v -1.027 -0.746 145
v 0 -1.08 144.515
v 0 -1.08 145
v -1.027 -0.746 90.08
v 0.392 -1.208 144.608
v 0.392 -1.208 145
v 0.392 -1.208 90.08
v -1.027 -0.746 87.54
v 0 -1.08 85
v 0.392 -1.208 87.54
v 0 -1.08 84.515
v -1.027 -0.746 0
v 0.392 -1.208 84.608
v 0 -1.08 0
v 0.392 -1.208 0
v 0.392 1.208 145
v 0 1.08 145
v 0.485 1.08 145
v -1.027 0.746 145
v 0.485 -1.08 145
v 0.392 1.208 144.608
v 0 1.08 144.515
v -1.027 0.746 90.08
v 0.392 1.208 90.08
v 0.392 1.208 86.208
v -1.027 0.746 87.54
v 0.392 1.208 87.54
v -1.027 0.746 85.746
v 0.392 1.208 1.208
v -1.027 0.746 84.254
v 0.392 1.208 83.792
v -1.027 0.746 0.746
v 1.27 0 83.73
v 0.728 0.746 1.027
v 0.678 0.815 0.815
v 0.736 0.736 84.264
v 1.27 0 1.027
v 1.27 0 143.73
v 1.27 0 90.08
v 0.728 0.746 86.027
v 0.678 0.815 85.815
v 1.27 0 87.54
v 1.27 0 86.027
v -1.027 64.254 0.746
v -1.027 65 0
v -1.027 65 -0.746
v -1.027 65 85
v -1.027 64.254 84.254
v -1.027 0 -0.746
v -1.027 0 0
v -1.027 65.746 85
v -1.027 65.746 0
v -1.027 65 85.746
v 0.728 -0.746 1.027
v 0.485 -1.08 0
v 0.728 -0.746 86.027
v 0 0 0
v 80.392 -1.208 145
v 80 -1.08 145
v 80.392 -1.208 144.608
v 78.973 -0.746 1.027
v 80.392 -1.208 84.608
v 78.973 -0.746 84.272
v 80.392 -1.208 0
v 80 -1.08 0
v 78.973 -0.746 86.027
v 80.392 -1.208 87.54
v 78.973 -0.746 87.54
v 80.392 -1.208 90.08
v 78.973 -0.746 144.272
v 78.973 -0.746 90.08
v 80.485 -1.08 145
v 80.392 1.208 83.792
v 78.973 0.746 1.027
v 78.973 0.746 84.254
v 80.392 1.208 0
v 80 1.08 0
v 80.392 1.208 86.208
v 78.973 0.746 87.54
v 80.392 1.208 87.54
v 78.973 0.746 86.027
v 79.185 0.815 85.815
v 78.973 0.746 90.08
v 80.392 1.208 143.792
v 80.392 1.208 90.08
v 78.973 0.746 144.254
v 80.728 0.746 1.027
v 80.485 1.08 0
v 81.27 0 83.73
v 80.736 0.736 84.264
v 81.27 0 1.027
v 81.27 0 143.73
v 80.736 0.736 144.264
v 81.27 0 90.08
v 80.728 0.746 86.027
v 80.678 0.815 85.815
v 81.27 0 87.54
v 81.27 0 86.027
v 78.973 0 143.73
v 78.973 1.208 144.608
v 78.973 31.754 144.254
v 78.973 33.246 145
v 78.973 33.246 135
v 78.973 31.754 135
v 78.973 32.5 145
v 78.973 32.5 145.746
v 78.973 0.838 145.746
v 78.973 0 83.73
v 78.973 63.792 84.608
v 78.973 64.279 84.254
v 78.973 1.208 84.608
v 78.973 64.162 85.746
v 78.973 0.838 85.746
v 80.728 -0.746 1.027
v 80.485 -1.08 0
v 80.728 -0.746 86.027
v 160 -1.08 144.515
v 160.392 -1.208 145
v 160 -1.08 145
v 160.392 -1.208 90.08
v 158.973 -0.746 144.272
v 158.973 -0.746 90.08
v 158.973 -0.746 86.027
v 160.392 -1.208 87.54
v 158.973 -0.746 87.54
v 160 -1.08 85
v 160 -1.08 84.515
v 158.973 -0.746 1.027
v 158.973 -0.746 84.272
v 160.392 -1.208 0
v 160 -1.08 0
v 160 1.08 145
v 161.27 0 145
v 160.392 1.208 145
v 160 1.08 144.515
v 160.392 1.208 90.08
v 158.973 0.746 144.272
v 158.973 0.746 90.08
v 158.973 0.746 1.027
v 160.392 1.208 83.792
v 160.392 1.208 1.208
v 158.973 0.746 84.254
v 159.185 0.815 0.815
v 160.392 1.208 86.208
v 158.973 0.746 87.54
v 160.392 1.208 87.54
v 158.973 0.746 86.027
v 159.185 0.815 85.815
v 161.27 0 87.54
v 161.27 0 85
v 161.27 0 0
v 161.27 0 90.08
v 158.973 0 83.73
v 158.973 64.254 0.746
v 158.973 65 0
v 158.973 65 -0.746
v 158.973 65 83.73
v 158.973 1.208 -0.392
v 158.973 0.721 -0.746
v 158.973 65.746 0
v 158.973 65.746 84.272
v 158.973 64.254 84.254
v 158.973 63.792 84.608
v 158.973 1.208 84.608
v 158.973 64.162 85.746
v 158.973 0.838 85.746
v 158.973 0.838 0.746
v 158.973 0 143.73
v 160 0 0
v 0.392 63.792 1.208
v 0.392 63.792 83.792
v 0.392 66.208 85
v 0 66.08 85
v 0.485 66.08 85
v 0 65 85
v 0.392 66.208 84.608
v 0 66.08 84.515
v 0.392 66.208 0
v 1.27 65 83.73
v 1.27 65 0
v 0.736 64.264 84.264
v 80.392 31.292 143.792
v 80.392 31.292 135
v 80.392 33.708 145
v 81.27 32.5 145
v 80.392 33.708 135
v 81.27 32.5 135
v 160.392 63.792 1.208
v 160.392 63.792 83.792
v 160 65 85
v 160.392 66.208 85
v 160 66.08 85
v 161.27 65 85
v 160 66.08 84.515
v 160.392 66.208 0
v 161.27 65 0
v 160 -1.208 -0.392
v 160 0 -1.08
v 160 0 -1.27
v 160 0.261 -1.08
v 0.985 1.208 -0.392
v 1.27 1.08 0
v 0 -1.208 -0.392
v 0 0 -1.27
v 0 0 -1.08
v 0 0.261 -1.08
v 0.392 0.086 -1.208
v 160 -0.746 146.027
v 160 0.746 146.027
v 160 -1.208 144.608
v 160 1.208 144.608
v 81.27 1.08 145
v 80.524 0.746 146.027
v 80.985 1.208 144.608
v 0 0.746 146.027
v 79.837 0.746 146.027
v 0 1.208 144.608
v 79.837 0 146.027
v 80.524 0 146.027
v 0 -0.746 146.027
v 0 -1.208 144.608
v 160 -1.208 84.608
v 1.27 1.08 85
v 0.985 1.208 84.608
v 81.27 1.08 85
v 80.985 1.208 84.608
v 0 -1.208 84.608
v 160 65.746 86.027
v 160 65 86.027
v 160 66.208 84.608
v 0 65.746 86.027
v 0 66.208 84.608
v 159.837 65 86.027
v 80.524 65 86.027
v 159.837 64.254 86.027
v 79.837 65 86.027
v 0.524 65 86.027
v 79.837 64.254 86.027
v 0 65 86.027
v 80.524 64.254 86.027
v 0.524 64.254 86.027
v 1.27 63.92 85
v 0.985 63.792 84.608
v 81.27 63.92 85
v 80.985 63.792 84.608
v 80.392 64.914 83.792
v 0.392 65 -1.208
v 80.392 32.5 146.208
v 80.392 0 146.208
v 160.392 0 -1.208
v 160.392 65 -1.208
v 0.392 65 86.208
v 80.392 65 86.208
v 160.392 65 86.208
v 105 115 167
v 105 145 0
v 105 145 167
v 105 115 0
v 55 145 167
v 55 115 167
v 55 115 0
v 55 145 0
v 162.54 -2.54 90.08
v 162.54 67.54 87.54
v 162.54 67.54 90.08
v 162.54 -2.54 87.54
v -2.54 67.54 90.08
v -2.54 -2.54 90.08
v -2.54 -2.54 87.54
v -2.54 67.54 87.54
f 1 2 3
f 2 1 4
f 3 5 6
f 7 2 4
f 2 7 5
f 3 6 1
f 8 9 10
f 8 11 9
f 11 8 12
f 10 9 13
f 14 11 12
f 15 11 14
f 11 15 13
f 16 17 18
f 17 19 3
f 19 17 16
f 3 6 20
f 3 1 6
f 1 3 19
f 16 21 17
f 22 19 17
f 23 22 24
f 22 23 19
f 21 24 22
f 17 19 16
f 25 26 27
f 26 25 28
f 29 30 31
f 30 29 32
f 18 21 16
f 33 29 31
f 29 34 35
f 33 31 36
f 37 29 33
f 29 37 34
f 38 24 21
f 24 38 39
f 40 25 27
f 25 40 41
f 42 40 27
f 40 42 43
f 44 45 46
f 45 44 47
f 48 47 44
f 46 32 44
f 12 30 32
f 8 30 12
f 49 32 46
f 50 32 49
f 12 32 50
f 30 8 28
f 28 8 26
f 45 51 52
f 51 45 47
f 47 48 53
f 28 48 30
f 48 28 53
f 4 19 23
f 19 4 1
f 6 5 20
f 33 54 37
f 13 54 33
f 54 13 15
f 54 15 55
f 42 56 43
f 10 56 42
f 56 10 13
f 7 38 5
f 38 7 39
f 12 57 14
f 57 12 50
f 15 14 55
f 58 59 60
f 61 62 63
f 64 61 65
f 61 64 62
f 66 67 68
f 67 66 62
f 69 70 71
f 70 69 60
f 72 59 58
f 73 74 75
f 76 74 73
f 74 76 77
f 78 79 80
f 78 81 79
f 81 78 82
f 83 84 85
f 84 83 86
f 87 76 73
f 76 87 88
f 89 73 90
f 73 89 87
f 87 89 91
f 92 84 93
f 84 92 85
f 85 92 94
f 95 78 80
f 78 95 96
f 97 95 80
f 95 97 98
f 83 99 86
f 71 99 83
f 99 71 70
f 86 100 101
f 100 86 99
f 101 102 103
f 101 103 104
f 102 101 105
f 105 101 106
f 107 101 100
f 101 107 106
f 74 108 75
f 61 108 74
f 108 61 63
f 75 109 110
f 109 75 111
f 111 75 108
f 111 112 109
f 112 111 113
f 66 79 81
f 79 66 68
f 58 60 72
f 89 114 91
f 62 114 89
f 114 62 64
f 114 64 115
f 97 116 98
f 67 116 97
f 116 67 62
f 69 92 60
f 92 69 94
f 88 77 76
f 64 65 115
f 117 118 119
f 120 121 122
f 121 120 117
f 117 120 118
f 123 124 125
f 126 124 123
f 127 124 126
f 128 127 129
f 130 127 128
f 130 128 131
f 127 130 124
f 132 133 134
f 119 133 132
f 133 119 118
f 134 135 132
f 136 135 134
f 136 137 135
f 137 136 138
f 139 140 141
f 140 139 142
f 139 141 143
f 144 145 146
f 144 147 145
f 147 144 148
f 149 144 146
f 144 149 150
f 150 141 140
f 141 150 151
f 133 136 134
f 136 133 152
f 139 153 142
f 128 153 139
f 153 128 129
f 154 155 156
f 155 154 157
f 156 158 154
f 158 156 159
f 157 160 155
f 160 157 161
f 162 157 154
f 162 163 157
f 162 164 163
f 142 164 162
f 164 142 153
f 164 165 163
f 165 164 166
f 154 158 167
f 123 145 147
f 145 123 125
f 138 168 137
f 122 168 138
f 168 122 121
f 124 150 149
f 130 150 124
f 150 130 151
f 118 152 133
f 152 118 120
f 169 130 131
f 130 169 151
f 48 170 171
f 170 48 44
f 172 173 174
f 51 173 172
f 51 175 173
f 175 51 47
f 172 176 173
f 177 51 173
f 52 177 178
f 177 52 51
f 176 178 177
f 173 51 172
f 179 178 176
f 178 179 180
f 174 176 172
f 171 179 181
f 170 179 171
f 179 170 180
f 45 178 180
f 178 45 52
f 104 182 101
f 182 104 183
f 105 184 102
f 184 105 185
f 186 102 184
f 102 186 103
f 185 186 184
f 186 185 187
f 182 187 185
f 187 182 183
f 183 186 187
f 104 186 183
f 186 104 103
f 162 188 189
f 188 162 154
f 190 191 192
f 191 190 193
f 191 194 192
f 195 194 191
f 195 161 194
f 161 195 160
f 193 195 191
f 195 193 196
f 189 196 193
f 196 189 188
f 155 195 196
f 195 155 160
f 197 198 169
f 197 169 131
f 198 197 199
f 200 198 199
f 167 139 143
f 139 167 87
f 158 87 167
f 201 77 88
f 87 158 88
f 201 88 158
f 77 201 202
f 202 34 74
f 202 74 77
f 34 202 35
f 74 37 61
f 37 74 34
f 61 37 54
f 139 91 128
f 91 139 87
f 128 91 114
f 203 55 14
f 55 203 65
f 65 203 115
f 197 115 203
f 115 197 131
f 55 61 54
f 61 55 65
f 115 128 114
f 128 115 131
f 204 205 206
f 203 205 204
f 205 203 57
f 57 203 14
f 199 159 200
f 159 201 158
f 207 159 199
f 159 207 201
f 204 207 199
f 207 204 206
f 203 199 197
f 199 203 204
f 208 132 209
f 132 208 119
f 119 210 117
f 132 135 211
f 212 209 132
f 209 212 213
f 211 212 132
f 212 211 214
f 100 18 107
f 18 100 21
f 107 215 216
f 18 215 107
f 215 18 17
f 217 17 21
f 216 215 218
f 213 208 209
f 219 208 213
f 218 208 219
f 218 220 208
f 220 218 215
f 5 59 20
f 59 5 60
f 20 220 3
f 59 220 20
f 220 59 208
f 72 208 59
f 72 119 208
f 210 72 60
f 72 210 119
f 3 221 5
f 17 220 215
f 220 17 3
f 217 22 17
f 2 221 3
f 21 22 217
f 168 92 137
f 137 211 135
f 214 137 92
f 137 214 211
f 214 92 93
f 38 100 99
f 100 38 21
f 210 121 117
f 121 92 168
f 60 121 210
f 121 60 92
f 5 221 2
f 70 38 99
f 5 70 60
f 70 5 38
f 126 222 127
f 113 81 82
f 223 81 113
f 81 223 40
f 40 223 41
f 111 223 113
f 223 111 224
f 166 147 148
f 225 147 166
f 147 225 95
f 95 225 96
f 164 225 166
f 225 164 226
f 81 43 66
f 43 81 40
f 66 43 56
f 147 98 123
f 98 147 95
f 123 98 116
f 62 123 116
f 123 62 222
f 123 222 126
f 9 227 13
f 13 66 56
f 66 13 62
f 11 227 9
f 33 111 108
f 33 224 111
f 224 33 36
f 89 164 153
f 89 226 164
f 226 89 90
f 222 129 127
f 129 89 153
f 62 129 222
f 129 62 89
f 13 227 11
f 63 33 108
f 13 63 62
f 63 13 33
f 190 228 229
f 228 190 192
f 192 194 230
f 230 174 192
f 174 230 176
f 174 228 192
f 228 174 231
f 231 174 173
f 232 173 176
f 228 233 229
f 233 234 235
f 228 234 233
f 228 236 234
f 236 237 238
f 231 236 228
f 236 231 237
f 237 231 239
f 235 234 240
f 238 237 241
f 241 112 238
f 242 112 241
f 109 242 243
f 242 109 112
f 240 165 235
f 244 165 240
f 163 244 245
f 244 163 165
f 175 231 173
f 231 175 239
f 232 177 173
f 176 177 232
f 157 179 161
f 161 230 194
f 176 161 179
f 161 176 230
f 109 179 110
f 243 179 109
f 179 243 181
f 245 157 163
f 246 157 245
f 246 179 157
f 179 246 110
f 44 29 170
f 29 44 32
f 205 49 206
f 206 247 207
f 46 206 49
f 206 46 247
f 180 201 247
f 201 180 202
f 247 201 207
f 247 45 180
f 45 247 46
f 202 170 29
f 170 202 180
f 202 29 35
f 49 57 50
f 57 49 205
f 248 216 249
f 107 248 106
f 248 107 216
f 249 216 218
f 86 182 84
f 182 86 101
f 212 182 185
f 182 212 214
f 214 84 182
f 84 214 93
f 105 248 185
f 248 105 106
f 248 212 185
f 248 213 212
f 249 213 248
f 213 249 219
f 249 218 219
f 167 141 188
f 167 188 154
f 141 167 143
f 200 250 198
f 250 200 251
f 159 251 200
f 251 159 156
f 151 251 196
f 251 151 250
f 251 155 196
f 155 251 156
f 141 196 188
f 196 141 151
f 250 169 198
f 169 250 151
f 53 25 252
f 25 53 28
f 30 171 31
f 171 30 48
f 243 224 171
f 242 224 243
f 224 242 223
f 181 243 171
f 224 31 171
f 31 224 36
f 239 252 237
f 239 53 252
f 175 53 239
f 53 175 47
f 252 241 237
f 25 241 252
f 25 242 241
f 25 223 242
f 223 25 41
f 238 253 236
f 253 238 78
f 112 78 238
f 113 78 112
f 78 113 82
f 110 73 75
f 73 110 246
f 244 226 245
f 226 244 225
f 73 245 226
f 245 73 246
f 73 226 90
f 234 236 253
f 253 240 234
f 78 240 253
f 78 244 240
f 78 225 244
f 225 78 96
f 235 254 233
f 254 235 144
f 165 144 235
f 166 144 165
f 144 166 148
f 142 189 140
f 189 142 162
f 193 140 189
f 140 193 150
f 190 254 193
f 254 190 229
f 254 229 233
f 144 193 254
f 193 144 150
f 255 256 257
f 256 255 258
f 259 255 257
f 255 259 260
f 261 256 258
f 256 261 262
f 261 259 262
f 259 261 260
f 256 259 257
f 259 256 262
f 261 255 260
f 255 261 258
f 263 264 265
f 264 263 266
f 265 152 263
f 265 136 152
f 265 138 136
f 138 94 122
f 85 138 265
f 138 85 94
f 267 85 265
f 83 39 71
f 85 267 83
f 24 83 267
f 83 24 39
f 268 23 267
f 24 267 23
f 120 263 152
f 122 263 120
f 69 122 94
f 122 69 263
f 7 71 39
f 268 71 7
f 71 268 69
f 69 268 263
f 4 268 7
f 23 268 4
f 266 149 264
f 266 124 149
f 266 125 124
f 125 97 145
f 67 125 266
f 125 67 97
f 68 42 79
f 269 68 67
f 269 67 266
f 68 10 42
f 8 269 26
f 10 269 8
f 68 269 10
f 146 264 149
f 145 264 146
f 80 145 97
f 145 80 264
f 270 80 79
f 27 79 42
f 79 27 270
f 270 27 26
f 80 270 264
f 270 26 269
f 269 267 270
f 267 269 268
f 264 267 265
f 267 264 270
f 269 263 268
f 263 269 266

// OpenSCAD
//yo
translate([largo/2-25,ancho + 50, 0])
color("yellow")
cube([50,30,167]);

// dimensiones del tubo
diametro= 2.54;

// dimensiones del armazón
largo= 160; // eje x
ancho= 65; //eje y
alto = 85; //eje z
uptable=60;
// dimensiones de la tabla
tablaX=largo;
offsetX=2.54*2;
tablaY=ancho;
offsetY=2.54*2;
tablaZ=2.54;

// tabla
color("white")
translate([-offsetX/2,-offsetY/2,alto+tablaZ])
cube([tablaX+offsetX,tablaY+offsetY,tablaZ]);

// armazon
//7 tubos verticales (ejeZ)
color("black"){

translate([0,0,0])
cylinder(alto+uptable, d=diametro); //origen


//tubo vertical enmedio
translate([largo/2,0,0])
cylinder(alto + uptable, d=diametro);


translate([largo,0,0])
cylinder(alto+uptable, d=diametro);


translate([0,ancho,0])
cylinder(alto, d=diametro);


// tubo para la lampara, arriba
translate([largo/2,ancho/2,alto + uptable-10])
cylinder(10, d=diametro);


translate([largo,ancho,0])
cylinder(alto, d=diametro);
}
// 4 tubos horizontales (a lo largo:ejeX)
color("black"){
translate([0,0,0])
rotate([0,90,0])
cylinder(largo, d=diametro);
    
translate([0,0,alto + uptable])
rotate([0,90,0])
cylinder(largo, d=diametro);

translate([0,0,alto])
rotate([0,90,0])
cylinder(largo, d=diametro);

//translate([0,ancho,0])
//rotate([0,90,0])
//cylinder(largo, d=diametro);

translate([0,ancho,alto])
rotate([0,90,0])
cylinder(largo, d=diametro);
}

// 6 tubos horizontales (a lo ancho:ejeY)
color("black"){
translate([0,0,0])
rotate([-90,0,0])
cylinder(ancho, d=diametro);

//translate([largo/2,0,0])
//rotate([-90,0,0])
//cylinder(ancho, d=diametro);


// tubo en lo alto
translate([largo/2,0,alto + uptable])
rotate([-90,0,0])
cylinder(ancho/2, d=diametro);

translate([largo,0,0])
rotate([-90,0,0])
cylinder(ancho, d=diametro);

translate([0,0,alto])
rotate([-90,0,0])
cylinder(ancho, d=diametro);

translate([largo/2,0,alto])
rotate([-90,0,0])
cylinder(ancho, d=diametro);

translate([largo,0,alto])
rotate([-90,0,0])
cylinder(ancho, d=diametro);
}

echo("Materiales");
echo("tubo:",6*alto+4*largo+6*ancho);
